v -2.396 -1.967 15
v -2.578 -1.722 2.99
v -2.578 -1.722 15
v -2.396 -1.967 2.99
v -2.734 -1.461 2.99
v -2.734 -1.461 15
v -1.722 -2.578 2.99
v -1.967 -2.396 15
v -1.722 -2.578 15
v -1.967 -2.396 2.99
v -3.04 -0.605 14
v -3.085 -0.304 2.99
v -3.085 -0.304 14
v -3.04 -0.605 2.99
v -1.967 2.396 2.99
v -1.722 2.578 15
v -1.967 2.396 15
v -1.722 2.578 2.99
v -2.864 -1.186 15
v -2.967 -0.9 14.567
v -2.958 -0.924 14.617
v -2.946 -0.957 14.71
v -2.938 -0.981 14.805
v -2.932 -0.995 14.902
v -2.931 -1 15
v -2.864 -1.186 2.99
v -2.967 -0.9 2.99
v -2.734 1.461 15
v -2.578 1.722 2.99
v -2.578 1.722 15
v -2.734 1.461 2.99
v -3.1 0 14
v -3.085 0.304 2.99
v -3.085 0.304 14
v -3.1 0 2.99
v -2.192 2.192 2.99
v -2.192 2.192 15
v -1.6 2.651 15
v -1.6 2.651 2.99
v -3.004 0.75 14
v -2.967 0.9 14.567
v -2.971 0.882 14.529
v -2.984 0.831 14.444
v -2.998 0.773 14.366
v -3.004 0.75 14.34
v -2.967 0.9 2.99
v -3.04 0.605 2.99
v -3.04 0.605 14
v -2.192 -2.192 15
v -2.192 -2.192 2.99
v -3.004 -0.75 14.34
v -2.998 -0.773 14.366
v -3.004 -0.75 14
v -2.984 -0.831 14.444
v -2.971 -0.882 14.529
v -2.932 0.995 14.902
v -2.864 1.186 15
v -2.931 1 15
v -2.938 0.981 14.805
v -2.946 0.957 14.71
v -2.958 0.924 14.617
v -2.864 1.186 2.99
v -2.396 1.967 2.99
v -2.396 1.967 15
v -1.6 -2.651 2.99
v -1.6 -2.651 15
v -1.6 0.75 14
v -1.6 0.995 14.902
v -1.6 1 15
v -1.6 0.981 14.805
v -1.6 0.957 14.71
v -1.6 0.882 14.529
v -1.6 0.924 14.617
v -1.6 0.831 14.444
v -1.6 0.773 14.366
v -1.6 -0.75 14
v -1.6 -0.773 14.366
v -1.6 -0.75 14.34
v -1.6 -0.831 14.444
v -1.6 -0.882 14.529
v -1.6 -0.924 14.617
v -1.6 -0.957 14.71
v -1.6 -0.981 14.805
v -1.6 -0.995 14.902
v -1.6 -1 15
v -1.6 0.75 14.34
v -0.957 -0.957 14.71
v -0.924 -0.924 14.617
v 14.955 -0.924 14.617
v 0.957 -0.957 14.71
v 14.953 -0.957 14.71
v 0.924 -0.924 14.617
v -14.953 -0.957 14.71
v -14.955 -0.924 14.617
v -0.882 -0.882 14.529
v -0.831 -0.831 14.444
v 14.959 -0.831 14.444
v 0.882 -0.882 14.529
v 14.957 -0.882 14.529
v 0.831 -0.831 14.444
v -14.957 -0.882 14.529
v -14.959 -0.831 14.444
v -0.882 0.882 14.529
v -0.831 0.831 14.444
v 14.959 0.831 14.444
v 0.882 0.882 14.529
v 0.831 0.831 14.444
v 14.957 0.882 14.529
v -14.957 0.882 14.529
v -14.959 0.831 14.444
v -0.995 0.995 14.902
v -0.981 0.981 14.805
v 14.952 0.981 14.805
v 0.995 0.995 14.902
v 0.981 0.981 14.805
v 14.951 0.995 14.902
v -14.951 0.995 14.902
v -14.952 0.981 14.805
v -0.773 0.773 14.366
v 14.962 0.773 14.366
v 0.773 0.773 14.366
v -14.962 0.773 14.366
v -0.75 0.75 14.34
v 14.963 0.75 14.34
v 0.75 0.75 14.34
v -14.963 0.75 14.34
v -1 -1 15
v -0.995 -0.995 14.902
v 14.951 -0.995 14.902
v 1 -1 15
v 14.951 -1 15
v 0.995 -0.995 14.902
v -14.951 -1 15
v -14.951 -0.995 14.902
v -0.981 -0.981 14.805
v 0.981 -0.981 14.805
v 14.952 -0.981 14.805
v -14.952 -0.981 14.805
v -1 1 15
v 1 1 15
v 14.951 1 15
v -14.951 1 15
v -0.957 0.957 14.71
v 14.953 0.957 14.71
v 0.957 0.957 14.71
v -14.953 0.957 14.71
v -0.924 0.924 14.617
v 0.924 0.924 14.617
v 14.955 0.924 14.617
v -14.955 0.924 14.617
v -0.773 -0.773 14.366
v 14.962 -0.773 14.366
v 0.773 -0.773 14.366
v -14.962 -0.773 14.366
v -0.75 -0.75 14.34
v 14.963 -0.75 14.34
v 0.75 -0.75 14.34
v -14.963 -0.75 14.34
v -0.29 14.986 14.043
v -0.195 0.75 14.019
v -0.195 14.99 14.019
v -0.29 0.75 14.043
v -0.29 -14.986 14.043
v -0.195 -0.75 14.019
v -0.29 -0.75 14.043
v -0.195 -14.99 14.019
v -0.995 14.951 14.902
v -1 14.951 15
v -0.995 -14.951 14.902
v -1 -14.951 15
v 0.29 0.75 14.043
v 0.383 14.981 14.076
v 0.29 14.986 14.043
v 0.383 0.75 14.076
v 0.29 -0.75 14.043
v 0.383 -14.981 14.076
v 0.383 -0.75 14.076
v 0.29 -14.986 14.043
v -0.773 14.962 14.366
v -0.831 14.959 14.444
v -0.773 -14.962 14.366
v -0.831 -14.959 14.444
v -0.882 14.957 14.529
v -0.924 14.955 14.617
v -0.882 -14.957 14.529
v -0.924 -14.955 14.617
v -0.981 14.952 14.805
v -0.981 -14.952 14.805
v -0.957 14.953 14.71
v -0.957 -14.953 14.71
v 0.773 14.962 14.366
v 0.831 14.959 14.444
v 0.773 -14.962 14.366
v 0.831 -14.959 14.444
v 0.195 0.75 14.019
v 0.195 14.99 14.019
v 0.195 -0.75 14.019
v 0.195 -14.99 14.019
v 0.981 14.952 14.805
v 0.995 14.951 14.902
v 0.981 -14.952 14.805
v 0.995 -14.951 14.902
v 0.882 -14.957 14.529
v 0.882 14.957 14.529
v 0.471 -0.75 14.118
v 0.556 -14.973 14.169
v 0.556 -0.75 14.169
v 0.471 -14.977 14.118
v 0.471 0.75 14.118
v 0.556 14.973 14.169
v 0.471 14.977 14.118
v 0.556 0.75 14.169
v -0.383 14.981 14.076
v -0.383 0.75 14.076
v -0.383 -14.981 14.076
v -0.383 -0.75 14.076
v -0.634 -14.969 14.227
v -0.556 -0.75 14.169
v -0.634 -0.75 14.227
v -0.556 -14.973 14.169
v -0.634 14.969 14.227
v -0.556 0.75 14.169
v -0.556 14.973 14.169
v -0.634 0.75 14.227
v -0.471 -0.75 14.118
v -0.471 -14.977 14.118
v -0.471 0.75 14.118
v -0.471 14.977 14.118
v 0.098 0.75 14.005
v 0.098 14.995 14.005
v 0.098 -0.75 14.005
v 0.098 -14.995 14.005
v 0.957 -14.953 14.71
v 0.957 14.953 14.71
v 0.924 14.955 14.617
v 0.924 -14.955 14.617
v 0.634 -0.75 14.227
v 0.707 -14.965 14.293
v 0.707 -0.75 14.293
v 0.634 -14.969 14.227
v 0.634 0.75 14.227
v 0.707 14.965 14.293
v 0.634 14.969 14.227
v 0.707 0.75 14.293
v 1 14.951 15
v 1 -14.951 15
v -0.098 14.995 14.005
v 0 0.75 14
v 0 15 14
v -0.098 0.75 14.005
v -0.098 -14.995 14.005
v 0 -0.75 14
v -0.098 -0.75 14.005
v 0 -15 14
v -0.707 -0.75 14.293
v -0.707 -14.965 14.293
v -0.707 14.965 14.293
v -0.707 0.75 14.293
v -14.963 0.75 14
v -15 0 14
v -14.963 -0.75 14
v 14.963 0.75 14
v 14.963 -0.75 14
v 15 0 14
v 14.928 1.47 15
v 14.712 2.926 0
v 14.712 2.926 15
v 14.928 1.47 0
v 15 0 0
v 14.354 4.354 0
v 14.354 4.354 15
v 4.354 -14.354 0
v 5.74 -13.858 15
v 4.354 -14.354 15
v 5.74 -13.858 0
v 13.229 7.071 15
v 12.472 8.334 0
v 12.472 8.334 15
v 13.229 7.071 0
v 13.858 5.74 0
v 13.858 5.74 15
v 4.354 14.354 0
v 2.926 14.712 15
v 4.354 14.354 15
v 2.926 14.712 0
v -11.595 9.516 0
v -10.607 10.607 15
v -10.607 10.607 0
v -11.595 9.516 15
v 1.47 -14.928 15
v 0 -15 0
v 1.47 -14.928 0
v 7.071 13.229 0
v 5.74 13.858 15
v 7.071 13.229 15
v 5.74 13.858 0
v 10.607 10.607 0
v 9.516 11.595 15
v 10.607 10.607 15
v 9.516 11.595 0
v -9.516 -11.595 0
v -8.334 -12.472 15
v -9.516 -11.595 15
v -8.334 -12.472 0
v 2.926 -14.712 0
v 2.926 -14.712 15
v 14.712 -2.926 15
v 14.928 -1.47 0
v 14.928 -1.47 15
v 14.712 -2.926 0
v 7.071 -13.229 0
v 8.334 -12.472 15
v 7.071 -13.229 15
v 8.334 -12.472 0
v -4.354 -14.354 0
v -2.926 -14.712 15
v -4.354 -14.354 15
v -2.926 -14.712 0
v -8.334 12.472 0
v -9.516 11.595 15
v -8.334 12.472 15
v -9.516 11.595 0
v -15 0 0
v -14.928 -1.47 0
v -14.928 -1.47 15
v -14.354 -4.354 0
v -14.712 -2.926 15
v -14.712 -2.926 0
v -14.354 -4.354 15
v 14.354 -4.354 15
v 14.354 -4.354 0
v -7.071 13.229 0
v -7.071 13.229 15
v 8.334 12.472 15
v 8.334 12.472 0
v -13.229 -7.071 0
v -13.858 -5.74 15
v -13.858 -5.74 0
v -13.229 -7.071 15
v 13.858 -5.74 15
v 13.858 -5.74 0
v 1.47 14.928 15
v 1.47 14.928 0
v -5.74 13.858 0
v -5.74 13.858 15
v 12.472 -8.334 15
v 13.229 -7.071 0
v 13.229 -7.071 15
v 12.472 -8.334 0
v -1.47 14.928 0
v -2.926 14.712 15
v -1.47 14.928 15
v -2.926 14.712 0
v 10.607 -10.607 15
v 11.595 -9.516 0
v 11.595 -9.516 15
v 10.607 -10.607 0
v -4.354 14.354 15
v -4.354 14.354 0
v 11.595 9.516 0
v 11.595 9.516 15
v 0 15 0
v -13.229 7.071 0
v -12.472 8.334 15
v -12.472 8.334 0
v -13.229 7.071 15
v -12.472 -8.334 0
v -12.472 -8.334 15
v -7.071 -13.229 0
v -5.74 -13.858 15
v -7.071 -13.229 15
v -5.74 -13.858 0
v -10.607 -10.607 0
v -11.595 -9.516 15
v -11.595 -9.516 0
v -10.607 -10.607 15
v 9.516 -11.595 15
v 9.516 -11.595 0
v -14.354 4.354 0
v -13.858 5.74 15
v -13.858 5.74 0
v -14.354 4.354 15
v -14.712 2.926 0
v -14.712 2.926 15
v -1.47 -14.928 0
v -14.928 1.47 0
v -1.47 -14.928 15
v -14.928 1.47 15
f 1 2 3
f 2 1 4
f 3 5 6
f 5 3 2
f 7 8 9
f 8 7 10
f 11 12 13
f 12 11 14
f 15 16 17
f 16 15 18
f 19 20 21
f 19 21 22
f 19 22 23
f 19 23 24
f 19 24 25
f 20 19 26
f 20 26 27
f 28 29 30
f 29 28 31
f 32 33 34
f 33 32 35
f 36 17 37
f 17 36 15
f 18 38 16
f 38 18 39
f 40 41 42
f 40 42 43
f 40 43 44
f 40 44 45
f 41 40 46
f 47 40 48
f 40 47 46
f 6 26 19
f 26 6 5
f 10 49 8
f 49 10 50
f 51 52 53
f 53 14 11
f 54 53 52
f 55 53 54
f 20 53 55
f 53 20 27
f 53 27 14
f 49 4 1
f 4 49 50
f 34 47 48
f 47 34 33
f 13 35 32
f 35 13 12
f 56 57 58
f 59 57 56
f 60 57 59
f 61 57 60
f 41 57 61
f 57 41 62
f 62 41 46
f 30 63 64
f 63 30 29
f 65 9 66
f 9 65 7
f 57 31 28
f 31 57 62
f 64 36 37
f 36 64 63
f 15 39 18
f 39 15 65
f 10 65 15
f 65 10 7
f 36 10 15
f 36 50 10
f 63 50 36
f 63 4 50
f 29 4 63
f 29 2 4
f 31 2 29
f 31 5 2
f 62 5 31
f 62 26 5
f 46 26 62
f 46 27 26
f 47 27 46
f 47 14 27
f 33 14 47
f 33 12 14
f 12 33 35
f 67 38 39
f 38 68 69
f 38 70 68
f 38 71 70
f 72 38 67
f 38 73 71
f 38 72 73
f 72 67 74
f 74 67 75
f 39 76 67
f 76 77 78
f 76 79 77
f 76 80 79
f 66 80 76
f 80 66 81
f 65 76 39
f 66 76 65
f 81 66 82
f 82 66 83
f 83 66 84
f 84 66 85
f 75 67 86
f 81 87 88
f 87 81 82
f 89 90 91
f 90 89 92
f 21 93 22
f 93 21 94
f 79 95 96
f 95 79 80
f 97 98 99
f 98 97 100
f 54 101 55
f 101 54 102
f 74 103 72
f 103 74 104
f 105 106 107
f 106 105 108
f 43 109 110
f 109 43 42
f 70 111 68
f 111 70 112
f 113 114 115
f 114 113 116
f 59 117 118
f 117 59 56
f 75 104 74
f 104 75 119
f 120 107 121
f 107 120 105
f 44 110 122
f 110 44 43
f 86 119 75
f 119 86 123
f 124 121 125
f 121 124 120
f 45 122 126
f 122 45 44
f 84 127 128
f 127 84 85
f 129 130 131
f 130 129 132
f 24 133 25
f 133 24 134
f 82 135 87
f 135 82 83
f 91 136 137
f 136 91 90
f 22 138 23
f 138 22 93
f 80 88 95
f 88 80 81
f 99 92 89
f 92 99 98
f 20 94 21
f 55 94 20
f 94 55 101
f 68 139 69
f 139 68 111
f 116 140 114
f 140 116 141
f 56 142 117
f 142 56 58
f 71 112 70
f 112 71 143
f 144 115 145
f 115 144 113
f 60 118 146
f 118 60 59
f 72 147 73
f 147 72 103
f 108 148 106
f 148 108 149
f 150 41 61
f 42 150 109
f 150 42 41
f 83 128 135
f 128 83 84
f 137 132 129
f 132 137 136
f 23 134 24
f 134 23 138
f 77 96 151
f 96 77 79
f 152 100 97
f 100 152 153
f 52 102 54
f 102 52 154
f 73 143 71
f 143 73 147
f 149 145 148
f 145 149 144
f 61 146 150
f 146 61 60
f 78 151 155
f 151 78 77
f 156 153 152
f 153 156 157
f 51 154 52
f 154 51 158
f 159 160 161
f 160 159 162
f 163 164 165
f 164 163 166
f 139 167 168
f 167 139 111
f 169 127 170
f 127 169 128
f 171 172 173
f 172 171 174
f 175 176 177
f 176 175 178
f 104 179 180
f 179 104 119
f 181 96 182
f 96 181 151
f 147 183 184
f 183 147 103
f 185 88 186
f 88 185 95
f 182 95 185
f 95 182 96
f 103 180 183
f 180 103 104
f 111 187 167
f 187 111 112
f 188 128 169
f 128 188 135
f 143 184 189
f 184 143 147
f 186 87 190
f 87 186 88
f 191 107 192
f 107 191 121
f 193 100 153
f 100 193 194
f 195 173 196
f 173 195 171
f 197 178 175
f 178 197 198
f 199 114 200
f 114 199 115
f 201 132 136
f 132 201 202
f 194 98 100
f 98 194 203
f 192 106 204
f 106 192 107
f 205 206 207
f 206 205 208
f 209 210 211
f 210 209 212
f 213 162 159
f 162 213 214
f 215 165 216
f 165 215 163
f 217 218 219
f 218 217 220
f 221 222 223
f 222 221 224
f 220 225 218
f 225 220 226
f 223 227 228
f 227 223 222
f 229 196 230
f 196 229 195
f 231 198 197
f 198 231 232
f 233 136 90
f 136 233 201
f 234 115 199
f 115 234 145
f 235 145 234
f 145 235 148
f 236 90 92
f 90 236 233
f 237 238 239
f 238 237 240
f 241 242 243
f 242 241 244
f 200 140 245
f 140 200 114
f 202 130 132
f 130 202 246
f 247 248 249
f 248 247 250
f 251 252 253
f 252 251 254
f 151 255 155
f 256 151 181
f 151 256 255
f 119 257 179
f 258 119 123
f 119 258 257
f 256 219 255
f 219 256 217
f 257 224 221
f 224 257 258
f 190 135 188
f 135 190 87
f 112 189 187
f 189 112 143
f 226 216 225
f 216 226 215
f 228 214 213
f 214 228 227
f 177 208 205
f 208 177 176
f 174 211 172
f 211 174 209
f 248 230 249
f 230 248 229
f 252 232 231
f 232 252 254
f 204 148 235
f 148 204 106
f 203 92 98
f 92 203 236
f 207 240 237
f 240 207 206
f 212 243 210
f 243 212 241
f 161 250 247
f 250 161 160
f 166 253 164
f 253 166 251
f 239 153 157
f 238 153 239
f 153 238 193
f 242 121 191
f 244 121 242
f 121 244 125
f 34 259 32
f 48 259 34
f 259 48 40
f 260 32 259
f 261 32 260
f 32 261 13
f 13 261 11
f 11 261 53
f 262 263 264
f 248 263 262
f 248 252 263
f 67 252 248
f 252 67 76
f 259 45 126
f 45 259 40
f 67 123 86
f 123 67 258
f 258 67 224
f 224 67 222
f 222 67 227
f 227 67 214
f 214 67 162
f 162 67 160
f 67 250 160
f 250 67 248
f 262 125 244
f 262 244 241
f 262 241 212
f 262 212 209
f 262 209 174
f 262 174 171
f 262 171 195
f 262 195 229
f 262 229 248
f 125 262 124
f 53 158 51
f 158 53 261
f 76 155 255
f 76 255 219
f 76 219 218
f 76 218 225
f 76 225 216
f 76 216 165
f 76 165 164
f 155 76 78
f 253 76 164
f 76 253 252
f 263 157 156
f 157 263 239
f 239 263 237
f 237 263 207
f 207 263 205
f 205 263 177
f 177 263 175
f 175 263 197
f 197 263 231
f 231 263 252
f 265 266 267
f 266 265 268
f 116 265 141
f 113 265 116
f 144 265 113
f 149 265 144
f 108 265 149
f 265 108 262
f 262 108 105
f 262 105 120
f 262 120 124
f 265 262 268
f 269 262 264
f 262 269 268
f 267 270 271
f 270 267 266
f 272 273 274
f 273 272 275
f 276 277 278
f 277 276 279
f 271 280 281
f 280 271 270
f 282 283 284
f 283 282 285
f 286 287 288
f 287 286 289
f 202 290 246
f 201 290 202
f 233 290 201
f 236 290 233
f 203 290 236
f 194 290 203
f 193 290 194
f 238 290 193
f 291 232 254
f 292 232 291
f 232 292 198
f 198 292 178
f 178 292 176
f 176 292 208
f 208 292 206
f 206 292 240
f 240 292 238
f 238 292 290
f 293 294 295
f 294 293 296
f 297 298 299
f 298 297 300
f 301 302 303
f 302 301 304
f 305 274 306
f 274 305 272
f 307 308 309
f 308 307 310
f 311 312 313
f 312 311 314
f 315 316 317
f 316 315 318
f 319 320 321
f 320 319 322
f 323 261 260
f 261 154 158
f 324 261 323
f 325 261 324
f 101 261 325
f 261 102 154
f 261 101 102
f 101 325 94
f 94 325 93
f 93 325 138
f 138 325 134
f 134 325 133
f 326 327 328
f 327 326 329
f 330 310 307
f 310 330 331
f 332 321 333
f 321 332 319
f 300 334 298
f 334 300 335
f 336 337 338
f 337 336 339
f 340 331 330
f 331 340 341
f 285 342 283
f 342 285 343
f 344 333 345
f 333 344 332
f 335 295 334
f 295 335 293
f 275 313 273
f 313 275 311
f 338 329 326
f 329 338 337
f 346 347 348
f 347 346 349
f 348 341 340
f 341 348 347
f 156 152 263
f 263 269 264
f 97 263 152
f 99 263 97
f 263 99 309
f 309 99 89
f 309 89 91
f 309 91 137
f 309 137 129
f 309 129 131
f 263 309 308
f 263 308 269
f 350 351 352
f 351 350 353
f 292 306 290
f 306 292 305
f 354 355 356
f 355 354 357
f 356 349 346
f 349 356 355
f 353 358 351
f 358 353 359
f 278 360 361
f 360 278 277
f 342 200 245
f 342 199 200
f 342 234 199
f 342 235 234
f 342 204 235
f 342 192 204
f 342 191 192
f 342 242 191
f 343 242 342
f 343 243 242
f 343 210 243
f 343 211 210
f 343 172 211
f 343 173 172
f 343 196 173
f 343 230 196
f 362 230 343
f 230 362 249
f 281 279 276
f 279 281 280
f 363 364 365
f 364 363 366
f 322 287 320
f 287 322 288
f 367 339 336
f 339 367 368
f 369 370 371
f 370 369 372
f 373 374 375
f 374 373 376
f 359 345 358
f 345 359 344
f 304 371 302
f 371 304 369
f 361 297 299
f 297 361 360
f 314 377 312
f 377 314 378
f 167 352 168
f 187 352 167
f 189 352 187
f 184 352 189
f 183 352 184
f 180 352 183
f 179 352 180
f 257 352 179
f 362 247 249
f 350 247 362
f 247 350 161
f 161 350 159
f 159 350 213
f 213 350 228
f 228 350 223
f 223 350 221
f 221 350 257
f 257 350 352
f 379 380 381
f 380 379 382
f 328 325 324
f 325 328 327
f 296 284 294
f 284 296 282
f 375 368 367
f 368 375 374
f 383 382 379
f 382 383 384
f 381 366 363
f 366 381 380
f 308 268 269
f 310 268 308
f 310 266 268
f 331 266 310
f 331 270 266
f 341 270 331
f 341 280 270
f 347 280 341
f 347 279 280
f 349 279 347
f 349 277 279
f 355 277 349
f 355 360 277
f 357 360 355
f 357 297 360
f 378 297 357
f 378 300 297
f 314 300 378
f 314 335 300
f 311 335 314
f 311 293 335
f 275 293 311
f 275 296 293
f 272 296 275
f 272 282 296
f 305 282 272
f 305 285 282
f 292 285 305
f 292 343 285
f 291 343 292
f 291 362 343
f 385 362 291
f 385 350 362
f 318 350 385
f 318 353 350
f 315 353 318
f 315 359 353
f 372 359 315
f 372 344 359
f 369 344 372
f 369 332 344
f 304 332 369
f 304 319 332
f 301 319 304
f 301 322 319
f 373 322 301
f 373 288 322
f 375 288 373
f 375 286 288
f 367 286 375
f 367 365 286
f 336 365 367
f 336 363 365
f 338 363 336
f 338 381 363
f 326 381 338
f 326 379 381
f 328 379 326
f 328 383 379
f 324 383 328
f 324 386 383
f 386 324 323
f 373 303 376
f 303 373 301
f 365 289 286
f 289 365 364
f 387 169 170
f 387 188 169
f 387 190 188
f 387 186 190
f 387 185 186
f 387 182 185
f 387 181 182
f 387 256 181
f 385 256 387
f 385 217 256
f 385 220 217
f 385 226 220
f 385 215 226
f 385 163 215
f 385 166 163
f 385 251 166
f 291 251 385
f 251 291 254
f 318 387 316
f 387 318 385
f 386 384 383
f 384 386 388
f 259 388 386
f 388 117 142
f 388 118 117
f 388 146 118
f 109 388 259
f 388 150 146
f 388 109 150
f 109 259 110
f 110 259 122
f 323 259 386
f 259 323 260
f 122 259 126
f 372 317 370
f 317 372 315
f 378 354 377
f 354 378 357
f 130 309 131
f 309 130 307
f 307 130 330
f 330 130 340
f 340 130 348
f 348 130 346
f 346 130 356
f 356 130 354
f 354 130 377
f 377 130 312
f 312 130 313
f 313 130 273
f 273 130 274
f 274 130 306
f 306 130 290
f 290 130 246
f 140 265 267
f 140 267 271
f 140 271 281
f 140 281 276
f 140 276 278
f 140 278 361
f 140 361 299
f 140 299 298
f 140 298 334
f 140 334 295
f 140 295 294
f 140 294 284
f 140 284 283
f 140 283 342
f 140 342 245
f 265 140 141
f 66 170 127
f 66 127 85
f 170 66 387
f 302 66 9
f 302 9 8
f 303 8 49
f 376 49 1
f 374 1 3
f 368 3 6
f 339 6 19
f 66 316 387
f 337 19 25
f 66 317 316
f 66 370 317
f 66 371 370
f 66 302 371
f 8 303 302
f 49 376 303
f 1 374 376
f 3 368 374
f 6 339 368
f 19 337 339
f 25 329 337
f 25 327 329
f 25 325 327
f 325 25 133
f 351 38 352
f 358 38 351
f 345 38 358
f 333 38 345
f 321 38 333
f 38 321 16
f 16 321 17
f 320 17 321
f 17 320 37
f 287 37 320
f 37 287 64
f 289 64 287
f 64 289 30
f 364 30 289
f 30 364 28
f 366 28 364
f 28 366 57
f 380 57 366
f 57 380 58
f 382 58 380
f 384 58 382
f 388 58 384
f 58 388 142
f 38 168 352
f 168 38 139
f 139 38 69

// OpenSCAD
// Built by bench/smallmodels/features/compiler.py from a list of features.
$fn = 64;
difference() {
  union() {
    translate([0, 0, 0]) cylinder(d = 30, h = 15);
  }
  union() {
    translate([0, 0, 2.99]) rotate([0, 0, 0]) difference() { cylinder(d = 6.2, h = 12.02); translate([-1.6, -6.2, -1]) cube([6.2, 12.4, 14.02]); }
    translate([0, 0, 15]) rotate([0, 0, 0]) rotate([0, 90, 0]) cylinder(d = 2, h = 1060, center = true);
    translate([0, 0, 15]) rotate([0, 0, 0]) rotate([90, 0, 0]) cylinder(d = 2, h = 1060, center = true);
    translate([0, 0, 14]) rotate([0, 0, 0]) translate([-15, -0.75, 0]) cube([30, 1.5, 1]);
  }
}
